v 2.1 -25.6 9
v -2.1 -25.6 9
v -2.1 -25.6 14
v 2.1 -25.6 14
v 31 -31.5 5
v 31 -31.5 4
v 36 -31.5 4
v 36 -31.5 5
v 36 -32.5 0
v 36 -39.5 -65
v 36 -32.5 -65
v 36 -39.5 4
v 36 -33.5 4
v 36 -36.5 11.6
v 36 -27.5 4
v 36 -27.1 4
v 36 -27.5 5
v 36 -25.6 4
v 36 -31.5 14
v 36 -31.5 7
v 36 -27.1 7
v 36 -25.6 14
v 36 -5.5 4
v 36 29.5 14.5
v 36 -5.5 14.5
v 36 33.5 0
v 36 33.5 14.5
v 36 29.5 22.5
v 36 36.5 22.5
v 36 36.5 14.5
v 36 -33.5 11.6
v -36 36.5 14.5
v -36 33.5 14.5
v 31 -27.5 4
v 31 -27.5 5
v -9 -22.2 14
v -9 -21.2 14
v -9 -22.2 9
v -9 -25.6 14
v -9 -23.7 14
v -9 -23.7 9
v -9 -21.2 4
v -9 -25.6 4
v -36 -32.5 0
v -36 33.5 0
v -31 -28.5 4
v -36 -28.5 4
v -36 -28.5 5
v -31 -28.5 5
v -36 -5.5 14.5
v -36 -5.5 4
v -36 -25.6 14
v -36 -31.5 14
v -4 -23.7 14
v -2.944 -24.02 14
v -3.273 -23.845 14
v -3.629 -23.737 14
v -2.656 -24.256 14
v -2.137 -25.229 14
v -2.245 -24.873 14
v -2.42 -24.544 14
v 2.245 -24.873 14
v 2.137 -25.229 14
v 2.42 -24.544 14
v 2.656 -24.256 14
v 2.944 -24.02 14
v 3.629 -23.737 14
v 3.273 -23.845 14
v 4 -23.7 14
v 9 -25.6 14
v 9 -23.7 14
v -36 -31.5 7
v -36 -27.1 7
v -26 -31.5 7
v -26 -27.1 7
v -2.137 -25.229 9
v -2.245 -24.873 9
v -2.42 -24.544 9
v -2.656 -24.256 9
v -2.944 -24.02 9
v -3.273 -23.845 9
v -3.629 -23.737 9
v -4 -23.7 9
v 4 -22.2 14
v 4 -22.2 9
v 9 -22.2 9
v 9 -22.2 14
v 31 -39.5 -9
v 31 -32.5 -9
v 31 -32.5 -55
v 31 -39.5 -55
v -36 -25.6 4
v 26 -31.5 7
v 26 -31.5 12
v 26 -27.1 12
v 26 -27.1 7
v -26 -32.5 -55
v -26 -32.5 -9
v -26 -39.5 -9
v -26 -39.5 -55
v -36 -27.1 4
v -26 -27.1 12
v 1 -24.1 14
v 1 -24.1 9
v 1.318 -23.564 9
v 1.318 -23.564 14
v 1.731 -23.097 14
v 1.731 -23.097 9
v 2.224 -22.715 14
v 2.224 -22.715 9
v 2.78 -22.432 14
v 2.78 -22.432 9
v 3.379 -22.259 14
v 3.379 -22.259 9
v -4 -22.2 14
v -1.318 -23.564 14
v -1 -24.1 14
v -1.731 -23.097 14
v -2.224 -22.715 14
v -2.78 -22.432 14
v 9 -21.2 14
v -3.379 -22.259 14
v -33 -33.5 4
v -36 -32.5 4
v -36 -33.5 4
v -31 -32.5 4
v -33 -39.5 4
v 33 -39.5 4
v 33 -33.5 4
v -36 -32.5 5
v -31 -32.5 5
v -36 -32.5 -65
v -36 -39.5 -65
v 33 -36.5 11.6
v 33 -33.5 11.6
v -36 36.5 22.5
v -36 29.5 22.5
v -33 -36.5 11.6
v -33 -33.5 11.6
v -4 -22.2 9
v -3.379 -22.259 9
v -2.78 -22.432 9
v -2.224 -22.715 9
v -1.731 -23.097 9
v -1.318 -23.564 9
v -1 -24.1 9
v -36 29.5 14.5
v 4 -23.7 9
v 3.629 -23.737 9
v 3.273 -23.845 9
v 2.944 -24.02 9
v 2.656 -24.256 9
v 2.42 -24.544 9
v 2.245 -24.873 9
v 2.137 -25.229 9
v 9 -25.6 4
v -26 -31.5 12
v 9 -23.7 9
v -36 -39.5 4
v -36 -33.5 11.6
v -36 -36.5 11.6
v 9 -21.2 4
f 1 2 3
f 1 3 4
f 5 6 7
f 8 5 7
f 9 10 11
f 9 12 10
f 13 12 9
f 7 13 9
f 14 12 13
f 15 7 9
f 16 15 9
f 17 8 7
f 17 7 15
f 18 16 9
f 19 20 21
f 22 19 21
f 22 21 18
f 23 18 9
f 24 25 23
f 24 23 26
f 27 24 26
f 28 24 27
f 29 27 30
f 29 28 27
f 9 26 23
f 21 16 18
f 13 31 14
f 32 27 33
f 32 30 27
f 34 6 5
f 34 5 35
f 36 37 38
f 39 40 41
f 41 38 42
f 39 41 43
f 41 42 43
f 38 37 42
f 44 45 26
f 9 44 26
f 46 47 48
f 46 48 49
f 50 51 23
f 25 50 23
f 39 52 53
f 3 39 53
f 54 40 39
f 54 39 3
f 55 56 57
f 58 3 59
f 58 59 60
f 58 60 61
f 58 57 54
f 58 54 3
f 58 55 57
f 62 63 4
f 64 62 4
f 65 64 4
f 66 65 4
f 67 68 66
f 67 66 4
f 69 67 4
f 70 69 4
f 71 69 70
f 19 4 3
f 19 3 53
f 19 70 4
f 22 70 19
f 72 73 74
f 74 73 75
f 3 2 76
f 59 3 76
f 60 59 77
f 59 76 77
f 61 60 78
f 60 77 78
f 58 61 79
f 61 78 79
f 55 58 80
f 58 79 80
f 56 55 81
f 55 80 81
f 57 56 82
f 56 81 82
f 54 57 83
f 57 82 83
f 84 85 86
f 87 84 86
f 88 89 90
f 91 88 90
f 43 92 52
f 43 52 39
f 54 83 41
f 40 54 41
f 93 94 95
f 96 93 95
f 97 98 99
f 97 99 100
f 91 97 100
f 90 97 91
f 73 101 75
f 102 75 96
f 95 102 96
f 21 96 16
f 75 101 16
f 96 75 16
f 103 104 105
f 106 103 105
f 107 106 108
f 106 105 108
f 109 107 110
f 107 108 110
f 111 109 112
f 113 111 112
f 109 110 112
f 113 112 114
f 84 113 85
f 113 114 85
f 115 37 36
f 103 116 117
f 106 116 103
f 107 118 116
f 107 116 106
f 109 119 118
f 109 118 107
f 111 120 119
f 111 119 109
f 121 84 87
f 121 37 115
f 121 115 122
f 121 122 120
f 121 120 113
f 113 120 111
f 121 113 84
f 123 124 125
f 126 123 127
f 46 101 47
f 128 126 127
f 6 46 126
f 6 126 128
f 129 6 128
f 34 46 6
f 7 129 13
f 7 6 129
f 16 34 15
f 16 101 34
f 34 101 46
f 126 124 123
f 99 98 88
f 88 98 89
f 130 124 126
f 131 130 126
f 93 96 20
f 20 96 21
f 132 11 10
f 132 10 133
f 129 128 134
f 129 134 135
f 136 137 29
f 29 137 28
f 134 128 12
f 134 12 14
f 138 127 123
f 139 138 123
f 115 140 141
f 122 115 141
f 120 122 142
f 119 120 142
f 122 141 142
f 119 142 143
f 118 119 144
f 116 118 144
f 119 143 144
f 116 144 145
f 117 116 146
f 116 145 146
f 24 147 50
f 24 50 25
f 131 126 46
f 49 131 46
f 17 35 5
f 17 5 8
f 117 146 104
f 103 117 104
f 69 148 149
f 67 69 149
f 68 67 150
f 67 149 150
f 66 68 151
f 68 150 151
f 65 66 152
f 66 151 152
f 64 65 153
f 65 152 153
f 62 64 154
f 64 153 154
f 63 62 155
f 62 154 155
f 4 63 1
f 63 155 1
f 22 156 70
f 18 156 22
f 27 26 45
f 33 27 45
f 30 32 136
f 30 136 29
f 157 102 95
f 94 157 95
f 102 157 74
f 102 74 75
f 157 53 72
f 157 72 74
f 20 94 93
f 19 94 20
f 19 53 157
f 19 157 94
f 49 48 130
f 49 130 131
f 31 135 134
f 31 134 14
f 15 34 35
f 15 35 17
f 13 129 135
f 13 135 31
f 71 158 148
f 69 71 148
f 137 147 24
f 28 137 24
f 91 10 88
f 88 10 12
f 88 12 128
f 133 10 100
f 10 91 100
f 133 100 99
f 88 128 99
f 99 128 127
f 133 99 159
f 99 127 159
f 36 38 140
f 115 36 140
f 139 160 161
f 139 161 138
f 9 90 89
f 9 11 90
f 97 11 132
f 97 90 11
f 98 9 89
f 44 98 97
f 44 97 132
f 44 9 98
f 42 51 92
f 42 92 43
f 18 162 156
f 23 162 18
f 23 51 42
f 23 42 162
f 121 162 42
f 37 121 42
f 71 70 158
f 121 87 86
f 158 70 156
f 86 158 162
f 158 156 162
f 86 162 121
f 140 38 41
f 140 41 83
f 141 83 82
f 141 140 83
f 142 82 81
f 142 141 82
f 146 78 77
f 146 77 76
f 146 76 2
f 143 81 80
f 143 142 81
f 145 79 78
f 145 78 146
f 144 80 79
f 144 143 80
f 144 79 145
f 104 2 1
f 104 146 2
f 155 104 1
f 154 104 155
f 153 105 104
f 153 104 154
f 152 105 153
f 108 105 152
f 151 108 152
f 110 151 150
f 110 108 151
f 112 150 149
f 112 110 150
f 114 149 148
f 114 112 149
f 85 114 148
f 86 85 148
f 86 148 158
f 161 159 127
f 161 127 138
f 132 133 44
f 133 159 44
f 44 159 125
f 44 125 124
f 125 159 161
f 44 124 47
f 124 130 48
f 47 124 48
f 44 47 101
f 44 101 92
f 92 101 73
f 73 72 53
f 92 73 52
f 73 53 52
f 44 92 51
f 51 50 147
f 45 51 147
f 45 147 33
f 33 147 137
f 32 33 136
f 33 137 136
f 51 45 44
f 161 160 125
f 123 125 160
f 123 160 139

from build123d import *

# Parameters (mm, degrees)
CROQUIS1_W               = 72
CROQUIS1_H               = 74
SALIENTE_EXTRUIR3_DEPTH  = 4
CROQUIS2_W               = 3
CROQUIS2_H               = 6
SALIENTE_EXTRUIR4_DEPTH  = 7.6
CORTAR_EXTRUIR3_DEPTH    = 83.938591741
CROQUIS5_W               = 5
CROQUIS5_H               = 4
SALIENTE_EXTRUIR5_DEPTH  = 1
CROQUIS9_W               = 72
CROQUIS9_H               = 1.5
SALIENTE_EXTRUIR6_DEPTH  = 8
CROQUIS10_W              = 72
CROQUIS10_H              = 5.9
SALIENTE_EXTRUIR7_DEPTH  = 2
CROQUIS11_W              = 10
CROQUIS11_H              = 4.4
SALIENTE_EXTRUIR10_DEPTH = 7
SALIENTE_EXTRUIR14_DEPTH = 10
CROQUIS15_W              = 18
CROQUIS15_H              = 4.4
SALIENTE_EXTRUIR15_DEPTH = 5
CROQUIS16_W              = 72
CROQUIS16_H              = 40
SALIENTE_EXTRUIR16_DEPTH = 10.5
CROQUIS17_W              = 72
CROQUIS17_H              = 5
SALIENTE_EXTRUIR17_DEPTH = 8
CROQUIS18_W              = 72
CROQUIS18_H              = 8
SALIENTE_EXTRUIR19_DEPTH = 2
CROQUIS19_W              = 72
CROQUIS19_H              = 1
CORTAR_EXTRUIR4_DEPTH    = 14.5
CROQUIS20_W              = 72
CROQUIS20_H              = 7
SALIENTE_EXTRUIR20_DEPTH = 65
CROQUIS21_W              = 57
CROQUIS21_H              = 46
CORTAR_EXTRUIR5_DEPTH    = 65


with BuildPart() as part:
    # Croquis1 → Saliente-Extruir3 (new body)
    with BuildSketch(Plane.XY):
        with Locations((0, -2.5)):
            Rectangle(CROQUIS1_W, CROQUIS1_H)
    extrude(amount=SALIENTE_EXTRUIR3_DEPTH)

    # Croquis2 → Saliente-Extruir4 (add)
    with BuildSketch(Plane.XY.offset(4)):
        with Locations((-34.5, -36.5)):
            Rectangle(CROQUIS2_W, CROQUIS2_H)
        with Locations((34.5, -36.5)):
            Rectangle(CROQUIS2_W, CROQUIS2_H)
    extrude(amount=SALIENTE_EXTRUIR4_DEPTH)

    # Croquis3 → Cortar-Extruir3 (cut, through all)
    with BuildSketch(Plane.ZY.offset(36)):
        Polygon((4, -39.5), (11.6, -36.5), (11.6, -39.5), align=None)
    extrude(amount=-CORTAR_EXTRUIR3_DEPTH, mode=Mode.SUBTRACT)

    # Croquis5 → Saliente-Extruir5 (add)
    with BuildSketch(Plane.XY.offset(4)):
        with Locations((-33.5, -30.5)):
            Rectangle(CROQUIS5_W, CROQUIS5_H)
        with Locations((33.5, -29.5)):
            Rectangle(CROQUIS5_W, CROQUIS5_H)
    extrude(amount=SALIENTE_EXTRUIR5_DEPTH)

    # Croquis9 → Saliente-Extruir6 (add)
    with BuildSketch(Plane.XY.offset(4)):
        with Locations((0, -26.35)):
            Rectangle(CROQUIS9_W, CROQUIS9_H)
    extrude(amount=SALIENTE_EXTRUIR6_DEPTH)

    # Croquis10 → Saliente-Extruir7 (add)
    with BuildSketch(Plane.XY.offset(12)):
        with Locations((0, -28.55)):
            Rectangle(CROQUIS10_W, CROQUIS10_H)
    extrude(amount=SALIENTE_EXTRUIR7_DEPTH)

    # Croquis11 → Saliente-Extruir10 (add)
    with BuildSketch(Plane.XY.offset(14)):
        with Locations((-31, -29.3)):
            Rectangle(CROQUIS11_W, CROQUIS11_H)
        with Locations((31, -29.3)):
            Rectangle(CROQUIS11_W, CROQUIS11_H)
    extrude(amount=-SALIENTE_EXTRUIR10_DEPTH)

    # Croquis14 → Saliente-Extruir14 (add)
    with BuildSketch(Plane.XY.offset(4)):
        with BuildLine():
            Line((-9, -23.7), (-9, -25.6))
            Line((-9, -25.6), (-2.1, -25.6))
            ThreePointArc((-2.1, -25.6), (-2.656497116, -24.256497116), (-4, -23.7))
            Line((-4, -23.7), (-9, -23.7))
        make_face()
        with BuildLine():
            Line((-9, -21.2), (-9, -22.2))
            Line((-9, -22.2), (-4, -22.2))
            ThreePointArc((-4, -22.2), (-2.22447191, -22.714955647), (-1, -24.1))
            Line((-1, -24.1), (1, -24.1))
            ThreePointArc((1, -24.1), (2.22447191, -22.714955647), (4, -22.2))
            Line((4, -22.2), (9, -22.2))
            Line((9, -22.2), (9, -21.2))
            Line((9, -21.2), (-9, -21.2))
        make_face()
        with BuildLine():
            ThreePointArc((4, -23.7), (2.656497116, -24.256497116), (2.1, -25.6))
            Line((2.1, -25.6), (9, -25.6))
            Line((9, -25.6), (9, -23.7))
            Line((9, -23.7), (4, -23.7))
        make_face()
    extrude(amount=SALIENTE_EXTRUIR14_DEPTH)

    # Croquis15 → Saliente-Extruir15 (add)
    with BuildSketch(Plane.XY.offset(4)):
        with Locations((0, -23.4)):
            Rectangle(CROQUIS15_W, CROQUIS15_H)
    extrude(amount=SALIENTE_EXTRUIR15_DEPTH)

    # Croquis16 → Saliente-Extruir16 (add)
    with BuildSketch(Plane.XY.offset(4)):
        with Locations((0, 14.5)):
            Rectangle(CROQUIS16_W, CROQUIS16_H)
    extrude(amount=SALIENTE_EXTRUIR16_DEPTH)

    # Croquis17 → Saliente-Extruir17 (add)
    with BuildSketch(Plane.XY.offset(14.5)):
        with Locations((0, 32)):
            Rectangle(CROQUIS17_W, CROQUIS17_H)
    extrude(amount=SALIENTE_EXTRUIR17_DEPTH)

    # Croquis18 → Saliente-Extruir19 (add)
    with BuildSketch(Plane(origin=(0, 34.5, 0), x_dir=(1, 0, 0), z_dir=(0, 1, 0))):
        with Locations((0, -18.5)):
            Rectangle(CROQUIS18_W, CROQUIS18_H)
    extrude(amount=SALIENTE_EXTRUIR19_DEPTH)

    # Croquis19 → Cortar-Extruir4 (cut)
    with BuildSketch(Plane(origin=(0, 0, 0), x_dir=(-1, 0, 0), z_dir=(0, 0, -1))):
        with Locations((0, 34)):
            Rectangle(CROQUIS19_W, CROQUIS19_H)
    extrude(amount=-CORTAR_EXTRUIR4_DEPTH, mode=Mode.SUBTRACT)

    # Croquis20 → Saliente-Extruir20 (add)
    with BuildSketch(Plane(origin=(0, 0, 0), x_dir=(-1, 0, 0), z_dir=(0, 0, -1))):
        with Locations((0, -36)):
            Rectangle(CROQUIS20_W, CROQUIS20_H)
    extrude(amount=SALIENTE_EXTRUIR20_DEPTH)

    # Croquis21 → Cortar-Extruir5 (cut)
    with BuildSketch(Plane(origin=(0, -32.5, 0), x_dir=(1, 0, 0), z_dir=(0, 1, 0))):
        with Locations((2.5, 32)):
            Rectangle(CROQUIS21_W, CROQUIS21_H)
    extrude(amount=-CORTAR_EXTRUIR5_DEPTH, mode=Mode.SUBTRACT)


solid = part.part
